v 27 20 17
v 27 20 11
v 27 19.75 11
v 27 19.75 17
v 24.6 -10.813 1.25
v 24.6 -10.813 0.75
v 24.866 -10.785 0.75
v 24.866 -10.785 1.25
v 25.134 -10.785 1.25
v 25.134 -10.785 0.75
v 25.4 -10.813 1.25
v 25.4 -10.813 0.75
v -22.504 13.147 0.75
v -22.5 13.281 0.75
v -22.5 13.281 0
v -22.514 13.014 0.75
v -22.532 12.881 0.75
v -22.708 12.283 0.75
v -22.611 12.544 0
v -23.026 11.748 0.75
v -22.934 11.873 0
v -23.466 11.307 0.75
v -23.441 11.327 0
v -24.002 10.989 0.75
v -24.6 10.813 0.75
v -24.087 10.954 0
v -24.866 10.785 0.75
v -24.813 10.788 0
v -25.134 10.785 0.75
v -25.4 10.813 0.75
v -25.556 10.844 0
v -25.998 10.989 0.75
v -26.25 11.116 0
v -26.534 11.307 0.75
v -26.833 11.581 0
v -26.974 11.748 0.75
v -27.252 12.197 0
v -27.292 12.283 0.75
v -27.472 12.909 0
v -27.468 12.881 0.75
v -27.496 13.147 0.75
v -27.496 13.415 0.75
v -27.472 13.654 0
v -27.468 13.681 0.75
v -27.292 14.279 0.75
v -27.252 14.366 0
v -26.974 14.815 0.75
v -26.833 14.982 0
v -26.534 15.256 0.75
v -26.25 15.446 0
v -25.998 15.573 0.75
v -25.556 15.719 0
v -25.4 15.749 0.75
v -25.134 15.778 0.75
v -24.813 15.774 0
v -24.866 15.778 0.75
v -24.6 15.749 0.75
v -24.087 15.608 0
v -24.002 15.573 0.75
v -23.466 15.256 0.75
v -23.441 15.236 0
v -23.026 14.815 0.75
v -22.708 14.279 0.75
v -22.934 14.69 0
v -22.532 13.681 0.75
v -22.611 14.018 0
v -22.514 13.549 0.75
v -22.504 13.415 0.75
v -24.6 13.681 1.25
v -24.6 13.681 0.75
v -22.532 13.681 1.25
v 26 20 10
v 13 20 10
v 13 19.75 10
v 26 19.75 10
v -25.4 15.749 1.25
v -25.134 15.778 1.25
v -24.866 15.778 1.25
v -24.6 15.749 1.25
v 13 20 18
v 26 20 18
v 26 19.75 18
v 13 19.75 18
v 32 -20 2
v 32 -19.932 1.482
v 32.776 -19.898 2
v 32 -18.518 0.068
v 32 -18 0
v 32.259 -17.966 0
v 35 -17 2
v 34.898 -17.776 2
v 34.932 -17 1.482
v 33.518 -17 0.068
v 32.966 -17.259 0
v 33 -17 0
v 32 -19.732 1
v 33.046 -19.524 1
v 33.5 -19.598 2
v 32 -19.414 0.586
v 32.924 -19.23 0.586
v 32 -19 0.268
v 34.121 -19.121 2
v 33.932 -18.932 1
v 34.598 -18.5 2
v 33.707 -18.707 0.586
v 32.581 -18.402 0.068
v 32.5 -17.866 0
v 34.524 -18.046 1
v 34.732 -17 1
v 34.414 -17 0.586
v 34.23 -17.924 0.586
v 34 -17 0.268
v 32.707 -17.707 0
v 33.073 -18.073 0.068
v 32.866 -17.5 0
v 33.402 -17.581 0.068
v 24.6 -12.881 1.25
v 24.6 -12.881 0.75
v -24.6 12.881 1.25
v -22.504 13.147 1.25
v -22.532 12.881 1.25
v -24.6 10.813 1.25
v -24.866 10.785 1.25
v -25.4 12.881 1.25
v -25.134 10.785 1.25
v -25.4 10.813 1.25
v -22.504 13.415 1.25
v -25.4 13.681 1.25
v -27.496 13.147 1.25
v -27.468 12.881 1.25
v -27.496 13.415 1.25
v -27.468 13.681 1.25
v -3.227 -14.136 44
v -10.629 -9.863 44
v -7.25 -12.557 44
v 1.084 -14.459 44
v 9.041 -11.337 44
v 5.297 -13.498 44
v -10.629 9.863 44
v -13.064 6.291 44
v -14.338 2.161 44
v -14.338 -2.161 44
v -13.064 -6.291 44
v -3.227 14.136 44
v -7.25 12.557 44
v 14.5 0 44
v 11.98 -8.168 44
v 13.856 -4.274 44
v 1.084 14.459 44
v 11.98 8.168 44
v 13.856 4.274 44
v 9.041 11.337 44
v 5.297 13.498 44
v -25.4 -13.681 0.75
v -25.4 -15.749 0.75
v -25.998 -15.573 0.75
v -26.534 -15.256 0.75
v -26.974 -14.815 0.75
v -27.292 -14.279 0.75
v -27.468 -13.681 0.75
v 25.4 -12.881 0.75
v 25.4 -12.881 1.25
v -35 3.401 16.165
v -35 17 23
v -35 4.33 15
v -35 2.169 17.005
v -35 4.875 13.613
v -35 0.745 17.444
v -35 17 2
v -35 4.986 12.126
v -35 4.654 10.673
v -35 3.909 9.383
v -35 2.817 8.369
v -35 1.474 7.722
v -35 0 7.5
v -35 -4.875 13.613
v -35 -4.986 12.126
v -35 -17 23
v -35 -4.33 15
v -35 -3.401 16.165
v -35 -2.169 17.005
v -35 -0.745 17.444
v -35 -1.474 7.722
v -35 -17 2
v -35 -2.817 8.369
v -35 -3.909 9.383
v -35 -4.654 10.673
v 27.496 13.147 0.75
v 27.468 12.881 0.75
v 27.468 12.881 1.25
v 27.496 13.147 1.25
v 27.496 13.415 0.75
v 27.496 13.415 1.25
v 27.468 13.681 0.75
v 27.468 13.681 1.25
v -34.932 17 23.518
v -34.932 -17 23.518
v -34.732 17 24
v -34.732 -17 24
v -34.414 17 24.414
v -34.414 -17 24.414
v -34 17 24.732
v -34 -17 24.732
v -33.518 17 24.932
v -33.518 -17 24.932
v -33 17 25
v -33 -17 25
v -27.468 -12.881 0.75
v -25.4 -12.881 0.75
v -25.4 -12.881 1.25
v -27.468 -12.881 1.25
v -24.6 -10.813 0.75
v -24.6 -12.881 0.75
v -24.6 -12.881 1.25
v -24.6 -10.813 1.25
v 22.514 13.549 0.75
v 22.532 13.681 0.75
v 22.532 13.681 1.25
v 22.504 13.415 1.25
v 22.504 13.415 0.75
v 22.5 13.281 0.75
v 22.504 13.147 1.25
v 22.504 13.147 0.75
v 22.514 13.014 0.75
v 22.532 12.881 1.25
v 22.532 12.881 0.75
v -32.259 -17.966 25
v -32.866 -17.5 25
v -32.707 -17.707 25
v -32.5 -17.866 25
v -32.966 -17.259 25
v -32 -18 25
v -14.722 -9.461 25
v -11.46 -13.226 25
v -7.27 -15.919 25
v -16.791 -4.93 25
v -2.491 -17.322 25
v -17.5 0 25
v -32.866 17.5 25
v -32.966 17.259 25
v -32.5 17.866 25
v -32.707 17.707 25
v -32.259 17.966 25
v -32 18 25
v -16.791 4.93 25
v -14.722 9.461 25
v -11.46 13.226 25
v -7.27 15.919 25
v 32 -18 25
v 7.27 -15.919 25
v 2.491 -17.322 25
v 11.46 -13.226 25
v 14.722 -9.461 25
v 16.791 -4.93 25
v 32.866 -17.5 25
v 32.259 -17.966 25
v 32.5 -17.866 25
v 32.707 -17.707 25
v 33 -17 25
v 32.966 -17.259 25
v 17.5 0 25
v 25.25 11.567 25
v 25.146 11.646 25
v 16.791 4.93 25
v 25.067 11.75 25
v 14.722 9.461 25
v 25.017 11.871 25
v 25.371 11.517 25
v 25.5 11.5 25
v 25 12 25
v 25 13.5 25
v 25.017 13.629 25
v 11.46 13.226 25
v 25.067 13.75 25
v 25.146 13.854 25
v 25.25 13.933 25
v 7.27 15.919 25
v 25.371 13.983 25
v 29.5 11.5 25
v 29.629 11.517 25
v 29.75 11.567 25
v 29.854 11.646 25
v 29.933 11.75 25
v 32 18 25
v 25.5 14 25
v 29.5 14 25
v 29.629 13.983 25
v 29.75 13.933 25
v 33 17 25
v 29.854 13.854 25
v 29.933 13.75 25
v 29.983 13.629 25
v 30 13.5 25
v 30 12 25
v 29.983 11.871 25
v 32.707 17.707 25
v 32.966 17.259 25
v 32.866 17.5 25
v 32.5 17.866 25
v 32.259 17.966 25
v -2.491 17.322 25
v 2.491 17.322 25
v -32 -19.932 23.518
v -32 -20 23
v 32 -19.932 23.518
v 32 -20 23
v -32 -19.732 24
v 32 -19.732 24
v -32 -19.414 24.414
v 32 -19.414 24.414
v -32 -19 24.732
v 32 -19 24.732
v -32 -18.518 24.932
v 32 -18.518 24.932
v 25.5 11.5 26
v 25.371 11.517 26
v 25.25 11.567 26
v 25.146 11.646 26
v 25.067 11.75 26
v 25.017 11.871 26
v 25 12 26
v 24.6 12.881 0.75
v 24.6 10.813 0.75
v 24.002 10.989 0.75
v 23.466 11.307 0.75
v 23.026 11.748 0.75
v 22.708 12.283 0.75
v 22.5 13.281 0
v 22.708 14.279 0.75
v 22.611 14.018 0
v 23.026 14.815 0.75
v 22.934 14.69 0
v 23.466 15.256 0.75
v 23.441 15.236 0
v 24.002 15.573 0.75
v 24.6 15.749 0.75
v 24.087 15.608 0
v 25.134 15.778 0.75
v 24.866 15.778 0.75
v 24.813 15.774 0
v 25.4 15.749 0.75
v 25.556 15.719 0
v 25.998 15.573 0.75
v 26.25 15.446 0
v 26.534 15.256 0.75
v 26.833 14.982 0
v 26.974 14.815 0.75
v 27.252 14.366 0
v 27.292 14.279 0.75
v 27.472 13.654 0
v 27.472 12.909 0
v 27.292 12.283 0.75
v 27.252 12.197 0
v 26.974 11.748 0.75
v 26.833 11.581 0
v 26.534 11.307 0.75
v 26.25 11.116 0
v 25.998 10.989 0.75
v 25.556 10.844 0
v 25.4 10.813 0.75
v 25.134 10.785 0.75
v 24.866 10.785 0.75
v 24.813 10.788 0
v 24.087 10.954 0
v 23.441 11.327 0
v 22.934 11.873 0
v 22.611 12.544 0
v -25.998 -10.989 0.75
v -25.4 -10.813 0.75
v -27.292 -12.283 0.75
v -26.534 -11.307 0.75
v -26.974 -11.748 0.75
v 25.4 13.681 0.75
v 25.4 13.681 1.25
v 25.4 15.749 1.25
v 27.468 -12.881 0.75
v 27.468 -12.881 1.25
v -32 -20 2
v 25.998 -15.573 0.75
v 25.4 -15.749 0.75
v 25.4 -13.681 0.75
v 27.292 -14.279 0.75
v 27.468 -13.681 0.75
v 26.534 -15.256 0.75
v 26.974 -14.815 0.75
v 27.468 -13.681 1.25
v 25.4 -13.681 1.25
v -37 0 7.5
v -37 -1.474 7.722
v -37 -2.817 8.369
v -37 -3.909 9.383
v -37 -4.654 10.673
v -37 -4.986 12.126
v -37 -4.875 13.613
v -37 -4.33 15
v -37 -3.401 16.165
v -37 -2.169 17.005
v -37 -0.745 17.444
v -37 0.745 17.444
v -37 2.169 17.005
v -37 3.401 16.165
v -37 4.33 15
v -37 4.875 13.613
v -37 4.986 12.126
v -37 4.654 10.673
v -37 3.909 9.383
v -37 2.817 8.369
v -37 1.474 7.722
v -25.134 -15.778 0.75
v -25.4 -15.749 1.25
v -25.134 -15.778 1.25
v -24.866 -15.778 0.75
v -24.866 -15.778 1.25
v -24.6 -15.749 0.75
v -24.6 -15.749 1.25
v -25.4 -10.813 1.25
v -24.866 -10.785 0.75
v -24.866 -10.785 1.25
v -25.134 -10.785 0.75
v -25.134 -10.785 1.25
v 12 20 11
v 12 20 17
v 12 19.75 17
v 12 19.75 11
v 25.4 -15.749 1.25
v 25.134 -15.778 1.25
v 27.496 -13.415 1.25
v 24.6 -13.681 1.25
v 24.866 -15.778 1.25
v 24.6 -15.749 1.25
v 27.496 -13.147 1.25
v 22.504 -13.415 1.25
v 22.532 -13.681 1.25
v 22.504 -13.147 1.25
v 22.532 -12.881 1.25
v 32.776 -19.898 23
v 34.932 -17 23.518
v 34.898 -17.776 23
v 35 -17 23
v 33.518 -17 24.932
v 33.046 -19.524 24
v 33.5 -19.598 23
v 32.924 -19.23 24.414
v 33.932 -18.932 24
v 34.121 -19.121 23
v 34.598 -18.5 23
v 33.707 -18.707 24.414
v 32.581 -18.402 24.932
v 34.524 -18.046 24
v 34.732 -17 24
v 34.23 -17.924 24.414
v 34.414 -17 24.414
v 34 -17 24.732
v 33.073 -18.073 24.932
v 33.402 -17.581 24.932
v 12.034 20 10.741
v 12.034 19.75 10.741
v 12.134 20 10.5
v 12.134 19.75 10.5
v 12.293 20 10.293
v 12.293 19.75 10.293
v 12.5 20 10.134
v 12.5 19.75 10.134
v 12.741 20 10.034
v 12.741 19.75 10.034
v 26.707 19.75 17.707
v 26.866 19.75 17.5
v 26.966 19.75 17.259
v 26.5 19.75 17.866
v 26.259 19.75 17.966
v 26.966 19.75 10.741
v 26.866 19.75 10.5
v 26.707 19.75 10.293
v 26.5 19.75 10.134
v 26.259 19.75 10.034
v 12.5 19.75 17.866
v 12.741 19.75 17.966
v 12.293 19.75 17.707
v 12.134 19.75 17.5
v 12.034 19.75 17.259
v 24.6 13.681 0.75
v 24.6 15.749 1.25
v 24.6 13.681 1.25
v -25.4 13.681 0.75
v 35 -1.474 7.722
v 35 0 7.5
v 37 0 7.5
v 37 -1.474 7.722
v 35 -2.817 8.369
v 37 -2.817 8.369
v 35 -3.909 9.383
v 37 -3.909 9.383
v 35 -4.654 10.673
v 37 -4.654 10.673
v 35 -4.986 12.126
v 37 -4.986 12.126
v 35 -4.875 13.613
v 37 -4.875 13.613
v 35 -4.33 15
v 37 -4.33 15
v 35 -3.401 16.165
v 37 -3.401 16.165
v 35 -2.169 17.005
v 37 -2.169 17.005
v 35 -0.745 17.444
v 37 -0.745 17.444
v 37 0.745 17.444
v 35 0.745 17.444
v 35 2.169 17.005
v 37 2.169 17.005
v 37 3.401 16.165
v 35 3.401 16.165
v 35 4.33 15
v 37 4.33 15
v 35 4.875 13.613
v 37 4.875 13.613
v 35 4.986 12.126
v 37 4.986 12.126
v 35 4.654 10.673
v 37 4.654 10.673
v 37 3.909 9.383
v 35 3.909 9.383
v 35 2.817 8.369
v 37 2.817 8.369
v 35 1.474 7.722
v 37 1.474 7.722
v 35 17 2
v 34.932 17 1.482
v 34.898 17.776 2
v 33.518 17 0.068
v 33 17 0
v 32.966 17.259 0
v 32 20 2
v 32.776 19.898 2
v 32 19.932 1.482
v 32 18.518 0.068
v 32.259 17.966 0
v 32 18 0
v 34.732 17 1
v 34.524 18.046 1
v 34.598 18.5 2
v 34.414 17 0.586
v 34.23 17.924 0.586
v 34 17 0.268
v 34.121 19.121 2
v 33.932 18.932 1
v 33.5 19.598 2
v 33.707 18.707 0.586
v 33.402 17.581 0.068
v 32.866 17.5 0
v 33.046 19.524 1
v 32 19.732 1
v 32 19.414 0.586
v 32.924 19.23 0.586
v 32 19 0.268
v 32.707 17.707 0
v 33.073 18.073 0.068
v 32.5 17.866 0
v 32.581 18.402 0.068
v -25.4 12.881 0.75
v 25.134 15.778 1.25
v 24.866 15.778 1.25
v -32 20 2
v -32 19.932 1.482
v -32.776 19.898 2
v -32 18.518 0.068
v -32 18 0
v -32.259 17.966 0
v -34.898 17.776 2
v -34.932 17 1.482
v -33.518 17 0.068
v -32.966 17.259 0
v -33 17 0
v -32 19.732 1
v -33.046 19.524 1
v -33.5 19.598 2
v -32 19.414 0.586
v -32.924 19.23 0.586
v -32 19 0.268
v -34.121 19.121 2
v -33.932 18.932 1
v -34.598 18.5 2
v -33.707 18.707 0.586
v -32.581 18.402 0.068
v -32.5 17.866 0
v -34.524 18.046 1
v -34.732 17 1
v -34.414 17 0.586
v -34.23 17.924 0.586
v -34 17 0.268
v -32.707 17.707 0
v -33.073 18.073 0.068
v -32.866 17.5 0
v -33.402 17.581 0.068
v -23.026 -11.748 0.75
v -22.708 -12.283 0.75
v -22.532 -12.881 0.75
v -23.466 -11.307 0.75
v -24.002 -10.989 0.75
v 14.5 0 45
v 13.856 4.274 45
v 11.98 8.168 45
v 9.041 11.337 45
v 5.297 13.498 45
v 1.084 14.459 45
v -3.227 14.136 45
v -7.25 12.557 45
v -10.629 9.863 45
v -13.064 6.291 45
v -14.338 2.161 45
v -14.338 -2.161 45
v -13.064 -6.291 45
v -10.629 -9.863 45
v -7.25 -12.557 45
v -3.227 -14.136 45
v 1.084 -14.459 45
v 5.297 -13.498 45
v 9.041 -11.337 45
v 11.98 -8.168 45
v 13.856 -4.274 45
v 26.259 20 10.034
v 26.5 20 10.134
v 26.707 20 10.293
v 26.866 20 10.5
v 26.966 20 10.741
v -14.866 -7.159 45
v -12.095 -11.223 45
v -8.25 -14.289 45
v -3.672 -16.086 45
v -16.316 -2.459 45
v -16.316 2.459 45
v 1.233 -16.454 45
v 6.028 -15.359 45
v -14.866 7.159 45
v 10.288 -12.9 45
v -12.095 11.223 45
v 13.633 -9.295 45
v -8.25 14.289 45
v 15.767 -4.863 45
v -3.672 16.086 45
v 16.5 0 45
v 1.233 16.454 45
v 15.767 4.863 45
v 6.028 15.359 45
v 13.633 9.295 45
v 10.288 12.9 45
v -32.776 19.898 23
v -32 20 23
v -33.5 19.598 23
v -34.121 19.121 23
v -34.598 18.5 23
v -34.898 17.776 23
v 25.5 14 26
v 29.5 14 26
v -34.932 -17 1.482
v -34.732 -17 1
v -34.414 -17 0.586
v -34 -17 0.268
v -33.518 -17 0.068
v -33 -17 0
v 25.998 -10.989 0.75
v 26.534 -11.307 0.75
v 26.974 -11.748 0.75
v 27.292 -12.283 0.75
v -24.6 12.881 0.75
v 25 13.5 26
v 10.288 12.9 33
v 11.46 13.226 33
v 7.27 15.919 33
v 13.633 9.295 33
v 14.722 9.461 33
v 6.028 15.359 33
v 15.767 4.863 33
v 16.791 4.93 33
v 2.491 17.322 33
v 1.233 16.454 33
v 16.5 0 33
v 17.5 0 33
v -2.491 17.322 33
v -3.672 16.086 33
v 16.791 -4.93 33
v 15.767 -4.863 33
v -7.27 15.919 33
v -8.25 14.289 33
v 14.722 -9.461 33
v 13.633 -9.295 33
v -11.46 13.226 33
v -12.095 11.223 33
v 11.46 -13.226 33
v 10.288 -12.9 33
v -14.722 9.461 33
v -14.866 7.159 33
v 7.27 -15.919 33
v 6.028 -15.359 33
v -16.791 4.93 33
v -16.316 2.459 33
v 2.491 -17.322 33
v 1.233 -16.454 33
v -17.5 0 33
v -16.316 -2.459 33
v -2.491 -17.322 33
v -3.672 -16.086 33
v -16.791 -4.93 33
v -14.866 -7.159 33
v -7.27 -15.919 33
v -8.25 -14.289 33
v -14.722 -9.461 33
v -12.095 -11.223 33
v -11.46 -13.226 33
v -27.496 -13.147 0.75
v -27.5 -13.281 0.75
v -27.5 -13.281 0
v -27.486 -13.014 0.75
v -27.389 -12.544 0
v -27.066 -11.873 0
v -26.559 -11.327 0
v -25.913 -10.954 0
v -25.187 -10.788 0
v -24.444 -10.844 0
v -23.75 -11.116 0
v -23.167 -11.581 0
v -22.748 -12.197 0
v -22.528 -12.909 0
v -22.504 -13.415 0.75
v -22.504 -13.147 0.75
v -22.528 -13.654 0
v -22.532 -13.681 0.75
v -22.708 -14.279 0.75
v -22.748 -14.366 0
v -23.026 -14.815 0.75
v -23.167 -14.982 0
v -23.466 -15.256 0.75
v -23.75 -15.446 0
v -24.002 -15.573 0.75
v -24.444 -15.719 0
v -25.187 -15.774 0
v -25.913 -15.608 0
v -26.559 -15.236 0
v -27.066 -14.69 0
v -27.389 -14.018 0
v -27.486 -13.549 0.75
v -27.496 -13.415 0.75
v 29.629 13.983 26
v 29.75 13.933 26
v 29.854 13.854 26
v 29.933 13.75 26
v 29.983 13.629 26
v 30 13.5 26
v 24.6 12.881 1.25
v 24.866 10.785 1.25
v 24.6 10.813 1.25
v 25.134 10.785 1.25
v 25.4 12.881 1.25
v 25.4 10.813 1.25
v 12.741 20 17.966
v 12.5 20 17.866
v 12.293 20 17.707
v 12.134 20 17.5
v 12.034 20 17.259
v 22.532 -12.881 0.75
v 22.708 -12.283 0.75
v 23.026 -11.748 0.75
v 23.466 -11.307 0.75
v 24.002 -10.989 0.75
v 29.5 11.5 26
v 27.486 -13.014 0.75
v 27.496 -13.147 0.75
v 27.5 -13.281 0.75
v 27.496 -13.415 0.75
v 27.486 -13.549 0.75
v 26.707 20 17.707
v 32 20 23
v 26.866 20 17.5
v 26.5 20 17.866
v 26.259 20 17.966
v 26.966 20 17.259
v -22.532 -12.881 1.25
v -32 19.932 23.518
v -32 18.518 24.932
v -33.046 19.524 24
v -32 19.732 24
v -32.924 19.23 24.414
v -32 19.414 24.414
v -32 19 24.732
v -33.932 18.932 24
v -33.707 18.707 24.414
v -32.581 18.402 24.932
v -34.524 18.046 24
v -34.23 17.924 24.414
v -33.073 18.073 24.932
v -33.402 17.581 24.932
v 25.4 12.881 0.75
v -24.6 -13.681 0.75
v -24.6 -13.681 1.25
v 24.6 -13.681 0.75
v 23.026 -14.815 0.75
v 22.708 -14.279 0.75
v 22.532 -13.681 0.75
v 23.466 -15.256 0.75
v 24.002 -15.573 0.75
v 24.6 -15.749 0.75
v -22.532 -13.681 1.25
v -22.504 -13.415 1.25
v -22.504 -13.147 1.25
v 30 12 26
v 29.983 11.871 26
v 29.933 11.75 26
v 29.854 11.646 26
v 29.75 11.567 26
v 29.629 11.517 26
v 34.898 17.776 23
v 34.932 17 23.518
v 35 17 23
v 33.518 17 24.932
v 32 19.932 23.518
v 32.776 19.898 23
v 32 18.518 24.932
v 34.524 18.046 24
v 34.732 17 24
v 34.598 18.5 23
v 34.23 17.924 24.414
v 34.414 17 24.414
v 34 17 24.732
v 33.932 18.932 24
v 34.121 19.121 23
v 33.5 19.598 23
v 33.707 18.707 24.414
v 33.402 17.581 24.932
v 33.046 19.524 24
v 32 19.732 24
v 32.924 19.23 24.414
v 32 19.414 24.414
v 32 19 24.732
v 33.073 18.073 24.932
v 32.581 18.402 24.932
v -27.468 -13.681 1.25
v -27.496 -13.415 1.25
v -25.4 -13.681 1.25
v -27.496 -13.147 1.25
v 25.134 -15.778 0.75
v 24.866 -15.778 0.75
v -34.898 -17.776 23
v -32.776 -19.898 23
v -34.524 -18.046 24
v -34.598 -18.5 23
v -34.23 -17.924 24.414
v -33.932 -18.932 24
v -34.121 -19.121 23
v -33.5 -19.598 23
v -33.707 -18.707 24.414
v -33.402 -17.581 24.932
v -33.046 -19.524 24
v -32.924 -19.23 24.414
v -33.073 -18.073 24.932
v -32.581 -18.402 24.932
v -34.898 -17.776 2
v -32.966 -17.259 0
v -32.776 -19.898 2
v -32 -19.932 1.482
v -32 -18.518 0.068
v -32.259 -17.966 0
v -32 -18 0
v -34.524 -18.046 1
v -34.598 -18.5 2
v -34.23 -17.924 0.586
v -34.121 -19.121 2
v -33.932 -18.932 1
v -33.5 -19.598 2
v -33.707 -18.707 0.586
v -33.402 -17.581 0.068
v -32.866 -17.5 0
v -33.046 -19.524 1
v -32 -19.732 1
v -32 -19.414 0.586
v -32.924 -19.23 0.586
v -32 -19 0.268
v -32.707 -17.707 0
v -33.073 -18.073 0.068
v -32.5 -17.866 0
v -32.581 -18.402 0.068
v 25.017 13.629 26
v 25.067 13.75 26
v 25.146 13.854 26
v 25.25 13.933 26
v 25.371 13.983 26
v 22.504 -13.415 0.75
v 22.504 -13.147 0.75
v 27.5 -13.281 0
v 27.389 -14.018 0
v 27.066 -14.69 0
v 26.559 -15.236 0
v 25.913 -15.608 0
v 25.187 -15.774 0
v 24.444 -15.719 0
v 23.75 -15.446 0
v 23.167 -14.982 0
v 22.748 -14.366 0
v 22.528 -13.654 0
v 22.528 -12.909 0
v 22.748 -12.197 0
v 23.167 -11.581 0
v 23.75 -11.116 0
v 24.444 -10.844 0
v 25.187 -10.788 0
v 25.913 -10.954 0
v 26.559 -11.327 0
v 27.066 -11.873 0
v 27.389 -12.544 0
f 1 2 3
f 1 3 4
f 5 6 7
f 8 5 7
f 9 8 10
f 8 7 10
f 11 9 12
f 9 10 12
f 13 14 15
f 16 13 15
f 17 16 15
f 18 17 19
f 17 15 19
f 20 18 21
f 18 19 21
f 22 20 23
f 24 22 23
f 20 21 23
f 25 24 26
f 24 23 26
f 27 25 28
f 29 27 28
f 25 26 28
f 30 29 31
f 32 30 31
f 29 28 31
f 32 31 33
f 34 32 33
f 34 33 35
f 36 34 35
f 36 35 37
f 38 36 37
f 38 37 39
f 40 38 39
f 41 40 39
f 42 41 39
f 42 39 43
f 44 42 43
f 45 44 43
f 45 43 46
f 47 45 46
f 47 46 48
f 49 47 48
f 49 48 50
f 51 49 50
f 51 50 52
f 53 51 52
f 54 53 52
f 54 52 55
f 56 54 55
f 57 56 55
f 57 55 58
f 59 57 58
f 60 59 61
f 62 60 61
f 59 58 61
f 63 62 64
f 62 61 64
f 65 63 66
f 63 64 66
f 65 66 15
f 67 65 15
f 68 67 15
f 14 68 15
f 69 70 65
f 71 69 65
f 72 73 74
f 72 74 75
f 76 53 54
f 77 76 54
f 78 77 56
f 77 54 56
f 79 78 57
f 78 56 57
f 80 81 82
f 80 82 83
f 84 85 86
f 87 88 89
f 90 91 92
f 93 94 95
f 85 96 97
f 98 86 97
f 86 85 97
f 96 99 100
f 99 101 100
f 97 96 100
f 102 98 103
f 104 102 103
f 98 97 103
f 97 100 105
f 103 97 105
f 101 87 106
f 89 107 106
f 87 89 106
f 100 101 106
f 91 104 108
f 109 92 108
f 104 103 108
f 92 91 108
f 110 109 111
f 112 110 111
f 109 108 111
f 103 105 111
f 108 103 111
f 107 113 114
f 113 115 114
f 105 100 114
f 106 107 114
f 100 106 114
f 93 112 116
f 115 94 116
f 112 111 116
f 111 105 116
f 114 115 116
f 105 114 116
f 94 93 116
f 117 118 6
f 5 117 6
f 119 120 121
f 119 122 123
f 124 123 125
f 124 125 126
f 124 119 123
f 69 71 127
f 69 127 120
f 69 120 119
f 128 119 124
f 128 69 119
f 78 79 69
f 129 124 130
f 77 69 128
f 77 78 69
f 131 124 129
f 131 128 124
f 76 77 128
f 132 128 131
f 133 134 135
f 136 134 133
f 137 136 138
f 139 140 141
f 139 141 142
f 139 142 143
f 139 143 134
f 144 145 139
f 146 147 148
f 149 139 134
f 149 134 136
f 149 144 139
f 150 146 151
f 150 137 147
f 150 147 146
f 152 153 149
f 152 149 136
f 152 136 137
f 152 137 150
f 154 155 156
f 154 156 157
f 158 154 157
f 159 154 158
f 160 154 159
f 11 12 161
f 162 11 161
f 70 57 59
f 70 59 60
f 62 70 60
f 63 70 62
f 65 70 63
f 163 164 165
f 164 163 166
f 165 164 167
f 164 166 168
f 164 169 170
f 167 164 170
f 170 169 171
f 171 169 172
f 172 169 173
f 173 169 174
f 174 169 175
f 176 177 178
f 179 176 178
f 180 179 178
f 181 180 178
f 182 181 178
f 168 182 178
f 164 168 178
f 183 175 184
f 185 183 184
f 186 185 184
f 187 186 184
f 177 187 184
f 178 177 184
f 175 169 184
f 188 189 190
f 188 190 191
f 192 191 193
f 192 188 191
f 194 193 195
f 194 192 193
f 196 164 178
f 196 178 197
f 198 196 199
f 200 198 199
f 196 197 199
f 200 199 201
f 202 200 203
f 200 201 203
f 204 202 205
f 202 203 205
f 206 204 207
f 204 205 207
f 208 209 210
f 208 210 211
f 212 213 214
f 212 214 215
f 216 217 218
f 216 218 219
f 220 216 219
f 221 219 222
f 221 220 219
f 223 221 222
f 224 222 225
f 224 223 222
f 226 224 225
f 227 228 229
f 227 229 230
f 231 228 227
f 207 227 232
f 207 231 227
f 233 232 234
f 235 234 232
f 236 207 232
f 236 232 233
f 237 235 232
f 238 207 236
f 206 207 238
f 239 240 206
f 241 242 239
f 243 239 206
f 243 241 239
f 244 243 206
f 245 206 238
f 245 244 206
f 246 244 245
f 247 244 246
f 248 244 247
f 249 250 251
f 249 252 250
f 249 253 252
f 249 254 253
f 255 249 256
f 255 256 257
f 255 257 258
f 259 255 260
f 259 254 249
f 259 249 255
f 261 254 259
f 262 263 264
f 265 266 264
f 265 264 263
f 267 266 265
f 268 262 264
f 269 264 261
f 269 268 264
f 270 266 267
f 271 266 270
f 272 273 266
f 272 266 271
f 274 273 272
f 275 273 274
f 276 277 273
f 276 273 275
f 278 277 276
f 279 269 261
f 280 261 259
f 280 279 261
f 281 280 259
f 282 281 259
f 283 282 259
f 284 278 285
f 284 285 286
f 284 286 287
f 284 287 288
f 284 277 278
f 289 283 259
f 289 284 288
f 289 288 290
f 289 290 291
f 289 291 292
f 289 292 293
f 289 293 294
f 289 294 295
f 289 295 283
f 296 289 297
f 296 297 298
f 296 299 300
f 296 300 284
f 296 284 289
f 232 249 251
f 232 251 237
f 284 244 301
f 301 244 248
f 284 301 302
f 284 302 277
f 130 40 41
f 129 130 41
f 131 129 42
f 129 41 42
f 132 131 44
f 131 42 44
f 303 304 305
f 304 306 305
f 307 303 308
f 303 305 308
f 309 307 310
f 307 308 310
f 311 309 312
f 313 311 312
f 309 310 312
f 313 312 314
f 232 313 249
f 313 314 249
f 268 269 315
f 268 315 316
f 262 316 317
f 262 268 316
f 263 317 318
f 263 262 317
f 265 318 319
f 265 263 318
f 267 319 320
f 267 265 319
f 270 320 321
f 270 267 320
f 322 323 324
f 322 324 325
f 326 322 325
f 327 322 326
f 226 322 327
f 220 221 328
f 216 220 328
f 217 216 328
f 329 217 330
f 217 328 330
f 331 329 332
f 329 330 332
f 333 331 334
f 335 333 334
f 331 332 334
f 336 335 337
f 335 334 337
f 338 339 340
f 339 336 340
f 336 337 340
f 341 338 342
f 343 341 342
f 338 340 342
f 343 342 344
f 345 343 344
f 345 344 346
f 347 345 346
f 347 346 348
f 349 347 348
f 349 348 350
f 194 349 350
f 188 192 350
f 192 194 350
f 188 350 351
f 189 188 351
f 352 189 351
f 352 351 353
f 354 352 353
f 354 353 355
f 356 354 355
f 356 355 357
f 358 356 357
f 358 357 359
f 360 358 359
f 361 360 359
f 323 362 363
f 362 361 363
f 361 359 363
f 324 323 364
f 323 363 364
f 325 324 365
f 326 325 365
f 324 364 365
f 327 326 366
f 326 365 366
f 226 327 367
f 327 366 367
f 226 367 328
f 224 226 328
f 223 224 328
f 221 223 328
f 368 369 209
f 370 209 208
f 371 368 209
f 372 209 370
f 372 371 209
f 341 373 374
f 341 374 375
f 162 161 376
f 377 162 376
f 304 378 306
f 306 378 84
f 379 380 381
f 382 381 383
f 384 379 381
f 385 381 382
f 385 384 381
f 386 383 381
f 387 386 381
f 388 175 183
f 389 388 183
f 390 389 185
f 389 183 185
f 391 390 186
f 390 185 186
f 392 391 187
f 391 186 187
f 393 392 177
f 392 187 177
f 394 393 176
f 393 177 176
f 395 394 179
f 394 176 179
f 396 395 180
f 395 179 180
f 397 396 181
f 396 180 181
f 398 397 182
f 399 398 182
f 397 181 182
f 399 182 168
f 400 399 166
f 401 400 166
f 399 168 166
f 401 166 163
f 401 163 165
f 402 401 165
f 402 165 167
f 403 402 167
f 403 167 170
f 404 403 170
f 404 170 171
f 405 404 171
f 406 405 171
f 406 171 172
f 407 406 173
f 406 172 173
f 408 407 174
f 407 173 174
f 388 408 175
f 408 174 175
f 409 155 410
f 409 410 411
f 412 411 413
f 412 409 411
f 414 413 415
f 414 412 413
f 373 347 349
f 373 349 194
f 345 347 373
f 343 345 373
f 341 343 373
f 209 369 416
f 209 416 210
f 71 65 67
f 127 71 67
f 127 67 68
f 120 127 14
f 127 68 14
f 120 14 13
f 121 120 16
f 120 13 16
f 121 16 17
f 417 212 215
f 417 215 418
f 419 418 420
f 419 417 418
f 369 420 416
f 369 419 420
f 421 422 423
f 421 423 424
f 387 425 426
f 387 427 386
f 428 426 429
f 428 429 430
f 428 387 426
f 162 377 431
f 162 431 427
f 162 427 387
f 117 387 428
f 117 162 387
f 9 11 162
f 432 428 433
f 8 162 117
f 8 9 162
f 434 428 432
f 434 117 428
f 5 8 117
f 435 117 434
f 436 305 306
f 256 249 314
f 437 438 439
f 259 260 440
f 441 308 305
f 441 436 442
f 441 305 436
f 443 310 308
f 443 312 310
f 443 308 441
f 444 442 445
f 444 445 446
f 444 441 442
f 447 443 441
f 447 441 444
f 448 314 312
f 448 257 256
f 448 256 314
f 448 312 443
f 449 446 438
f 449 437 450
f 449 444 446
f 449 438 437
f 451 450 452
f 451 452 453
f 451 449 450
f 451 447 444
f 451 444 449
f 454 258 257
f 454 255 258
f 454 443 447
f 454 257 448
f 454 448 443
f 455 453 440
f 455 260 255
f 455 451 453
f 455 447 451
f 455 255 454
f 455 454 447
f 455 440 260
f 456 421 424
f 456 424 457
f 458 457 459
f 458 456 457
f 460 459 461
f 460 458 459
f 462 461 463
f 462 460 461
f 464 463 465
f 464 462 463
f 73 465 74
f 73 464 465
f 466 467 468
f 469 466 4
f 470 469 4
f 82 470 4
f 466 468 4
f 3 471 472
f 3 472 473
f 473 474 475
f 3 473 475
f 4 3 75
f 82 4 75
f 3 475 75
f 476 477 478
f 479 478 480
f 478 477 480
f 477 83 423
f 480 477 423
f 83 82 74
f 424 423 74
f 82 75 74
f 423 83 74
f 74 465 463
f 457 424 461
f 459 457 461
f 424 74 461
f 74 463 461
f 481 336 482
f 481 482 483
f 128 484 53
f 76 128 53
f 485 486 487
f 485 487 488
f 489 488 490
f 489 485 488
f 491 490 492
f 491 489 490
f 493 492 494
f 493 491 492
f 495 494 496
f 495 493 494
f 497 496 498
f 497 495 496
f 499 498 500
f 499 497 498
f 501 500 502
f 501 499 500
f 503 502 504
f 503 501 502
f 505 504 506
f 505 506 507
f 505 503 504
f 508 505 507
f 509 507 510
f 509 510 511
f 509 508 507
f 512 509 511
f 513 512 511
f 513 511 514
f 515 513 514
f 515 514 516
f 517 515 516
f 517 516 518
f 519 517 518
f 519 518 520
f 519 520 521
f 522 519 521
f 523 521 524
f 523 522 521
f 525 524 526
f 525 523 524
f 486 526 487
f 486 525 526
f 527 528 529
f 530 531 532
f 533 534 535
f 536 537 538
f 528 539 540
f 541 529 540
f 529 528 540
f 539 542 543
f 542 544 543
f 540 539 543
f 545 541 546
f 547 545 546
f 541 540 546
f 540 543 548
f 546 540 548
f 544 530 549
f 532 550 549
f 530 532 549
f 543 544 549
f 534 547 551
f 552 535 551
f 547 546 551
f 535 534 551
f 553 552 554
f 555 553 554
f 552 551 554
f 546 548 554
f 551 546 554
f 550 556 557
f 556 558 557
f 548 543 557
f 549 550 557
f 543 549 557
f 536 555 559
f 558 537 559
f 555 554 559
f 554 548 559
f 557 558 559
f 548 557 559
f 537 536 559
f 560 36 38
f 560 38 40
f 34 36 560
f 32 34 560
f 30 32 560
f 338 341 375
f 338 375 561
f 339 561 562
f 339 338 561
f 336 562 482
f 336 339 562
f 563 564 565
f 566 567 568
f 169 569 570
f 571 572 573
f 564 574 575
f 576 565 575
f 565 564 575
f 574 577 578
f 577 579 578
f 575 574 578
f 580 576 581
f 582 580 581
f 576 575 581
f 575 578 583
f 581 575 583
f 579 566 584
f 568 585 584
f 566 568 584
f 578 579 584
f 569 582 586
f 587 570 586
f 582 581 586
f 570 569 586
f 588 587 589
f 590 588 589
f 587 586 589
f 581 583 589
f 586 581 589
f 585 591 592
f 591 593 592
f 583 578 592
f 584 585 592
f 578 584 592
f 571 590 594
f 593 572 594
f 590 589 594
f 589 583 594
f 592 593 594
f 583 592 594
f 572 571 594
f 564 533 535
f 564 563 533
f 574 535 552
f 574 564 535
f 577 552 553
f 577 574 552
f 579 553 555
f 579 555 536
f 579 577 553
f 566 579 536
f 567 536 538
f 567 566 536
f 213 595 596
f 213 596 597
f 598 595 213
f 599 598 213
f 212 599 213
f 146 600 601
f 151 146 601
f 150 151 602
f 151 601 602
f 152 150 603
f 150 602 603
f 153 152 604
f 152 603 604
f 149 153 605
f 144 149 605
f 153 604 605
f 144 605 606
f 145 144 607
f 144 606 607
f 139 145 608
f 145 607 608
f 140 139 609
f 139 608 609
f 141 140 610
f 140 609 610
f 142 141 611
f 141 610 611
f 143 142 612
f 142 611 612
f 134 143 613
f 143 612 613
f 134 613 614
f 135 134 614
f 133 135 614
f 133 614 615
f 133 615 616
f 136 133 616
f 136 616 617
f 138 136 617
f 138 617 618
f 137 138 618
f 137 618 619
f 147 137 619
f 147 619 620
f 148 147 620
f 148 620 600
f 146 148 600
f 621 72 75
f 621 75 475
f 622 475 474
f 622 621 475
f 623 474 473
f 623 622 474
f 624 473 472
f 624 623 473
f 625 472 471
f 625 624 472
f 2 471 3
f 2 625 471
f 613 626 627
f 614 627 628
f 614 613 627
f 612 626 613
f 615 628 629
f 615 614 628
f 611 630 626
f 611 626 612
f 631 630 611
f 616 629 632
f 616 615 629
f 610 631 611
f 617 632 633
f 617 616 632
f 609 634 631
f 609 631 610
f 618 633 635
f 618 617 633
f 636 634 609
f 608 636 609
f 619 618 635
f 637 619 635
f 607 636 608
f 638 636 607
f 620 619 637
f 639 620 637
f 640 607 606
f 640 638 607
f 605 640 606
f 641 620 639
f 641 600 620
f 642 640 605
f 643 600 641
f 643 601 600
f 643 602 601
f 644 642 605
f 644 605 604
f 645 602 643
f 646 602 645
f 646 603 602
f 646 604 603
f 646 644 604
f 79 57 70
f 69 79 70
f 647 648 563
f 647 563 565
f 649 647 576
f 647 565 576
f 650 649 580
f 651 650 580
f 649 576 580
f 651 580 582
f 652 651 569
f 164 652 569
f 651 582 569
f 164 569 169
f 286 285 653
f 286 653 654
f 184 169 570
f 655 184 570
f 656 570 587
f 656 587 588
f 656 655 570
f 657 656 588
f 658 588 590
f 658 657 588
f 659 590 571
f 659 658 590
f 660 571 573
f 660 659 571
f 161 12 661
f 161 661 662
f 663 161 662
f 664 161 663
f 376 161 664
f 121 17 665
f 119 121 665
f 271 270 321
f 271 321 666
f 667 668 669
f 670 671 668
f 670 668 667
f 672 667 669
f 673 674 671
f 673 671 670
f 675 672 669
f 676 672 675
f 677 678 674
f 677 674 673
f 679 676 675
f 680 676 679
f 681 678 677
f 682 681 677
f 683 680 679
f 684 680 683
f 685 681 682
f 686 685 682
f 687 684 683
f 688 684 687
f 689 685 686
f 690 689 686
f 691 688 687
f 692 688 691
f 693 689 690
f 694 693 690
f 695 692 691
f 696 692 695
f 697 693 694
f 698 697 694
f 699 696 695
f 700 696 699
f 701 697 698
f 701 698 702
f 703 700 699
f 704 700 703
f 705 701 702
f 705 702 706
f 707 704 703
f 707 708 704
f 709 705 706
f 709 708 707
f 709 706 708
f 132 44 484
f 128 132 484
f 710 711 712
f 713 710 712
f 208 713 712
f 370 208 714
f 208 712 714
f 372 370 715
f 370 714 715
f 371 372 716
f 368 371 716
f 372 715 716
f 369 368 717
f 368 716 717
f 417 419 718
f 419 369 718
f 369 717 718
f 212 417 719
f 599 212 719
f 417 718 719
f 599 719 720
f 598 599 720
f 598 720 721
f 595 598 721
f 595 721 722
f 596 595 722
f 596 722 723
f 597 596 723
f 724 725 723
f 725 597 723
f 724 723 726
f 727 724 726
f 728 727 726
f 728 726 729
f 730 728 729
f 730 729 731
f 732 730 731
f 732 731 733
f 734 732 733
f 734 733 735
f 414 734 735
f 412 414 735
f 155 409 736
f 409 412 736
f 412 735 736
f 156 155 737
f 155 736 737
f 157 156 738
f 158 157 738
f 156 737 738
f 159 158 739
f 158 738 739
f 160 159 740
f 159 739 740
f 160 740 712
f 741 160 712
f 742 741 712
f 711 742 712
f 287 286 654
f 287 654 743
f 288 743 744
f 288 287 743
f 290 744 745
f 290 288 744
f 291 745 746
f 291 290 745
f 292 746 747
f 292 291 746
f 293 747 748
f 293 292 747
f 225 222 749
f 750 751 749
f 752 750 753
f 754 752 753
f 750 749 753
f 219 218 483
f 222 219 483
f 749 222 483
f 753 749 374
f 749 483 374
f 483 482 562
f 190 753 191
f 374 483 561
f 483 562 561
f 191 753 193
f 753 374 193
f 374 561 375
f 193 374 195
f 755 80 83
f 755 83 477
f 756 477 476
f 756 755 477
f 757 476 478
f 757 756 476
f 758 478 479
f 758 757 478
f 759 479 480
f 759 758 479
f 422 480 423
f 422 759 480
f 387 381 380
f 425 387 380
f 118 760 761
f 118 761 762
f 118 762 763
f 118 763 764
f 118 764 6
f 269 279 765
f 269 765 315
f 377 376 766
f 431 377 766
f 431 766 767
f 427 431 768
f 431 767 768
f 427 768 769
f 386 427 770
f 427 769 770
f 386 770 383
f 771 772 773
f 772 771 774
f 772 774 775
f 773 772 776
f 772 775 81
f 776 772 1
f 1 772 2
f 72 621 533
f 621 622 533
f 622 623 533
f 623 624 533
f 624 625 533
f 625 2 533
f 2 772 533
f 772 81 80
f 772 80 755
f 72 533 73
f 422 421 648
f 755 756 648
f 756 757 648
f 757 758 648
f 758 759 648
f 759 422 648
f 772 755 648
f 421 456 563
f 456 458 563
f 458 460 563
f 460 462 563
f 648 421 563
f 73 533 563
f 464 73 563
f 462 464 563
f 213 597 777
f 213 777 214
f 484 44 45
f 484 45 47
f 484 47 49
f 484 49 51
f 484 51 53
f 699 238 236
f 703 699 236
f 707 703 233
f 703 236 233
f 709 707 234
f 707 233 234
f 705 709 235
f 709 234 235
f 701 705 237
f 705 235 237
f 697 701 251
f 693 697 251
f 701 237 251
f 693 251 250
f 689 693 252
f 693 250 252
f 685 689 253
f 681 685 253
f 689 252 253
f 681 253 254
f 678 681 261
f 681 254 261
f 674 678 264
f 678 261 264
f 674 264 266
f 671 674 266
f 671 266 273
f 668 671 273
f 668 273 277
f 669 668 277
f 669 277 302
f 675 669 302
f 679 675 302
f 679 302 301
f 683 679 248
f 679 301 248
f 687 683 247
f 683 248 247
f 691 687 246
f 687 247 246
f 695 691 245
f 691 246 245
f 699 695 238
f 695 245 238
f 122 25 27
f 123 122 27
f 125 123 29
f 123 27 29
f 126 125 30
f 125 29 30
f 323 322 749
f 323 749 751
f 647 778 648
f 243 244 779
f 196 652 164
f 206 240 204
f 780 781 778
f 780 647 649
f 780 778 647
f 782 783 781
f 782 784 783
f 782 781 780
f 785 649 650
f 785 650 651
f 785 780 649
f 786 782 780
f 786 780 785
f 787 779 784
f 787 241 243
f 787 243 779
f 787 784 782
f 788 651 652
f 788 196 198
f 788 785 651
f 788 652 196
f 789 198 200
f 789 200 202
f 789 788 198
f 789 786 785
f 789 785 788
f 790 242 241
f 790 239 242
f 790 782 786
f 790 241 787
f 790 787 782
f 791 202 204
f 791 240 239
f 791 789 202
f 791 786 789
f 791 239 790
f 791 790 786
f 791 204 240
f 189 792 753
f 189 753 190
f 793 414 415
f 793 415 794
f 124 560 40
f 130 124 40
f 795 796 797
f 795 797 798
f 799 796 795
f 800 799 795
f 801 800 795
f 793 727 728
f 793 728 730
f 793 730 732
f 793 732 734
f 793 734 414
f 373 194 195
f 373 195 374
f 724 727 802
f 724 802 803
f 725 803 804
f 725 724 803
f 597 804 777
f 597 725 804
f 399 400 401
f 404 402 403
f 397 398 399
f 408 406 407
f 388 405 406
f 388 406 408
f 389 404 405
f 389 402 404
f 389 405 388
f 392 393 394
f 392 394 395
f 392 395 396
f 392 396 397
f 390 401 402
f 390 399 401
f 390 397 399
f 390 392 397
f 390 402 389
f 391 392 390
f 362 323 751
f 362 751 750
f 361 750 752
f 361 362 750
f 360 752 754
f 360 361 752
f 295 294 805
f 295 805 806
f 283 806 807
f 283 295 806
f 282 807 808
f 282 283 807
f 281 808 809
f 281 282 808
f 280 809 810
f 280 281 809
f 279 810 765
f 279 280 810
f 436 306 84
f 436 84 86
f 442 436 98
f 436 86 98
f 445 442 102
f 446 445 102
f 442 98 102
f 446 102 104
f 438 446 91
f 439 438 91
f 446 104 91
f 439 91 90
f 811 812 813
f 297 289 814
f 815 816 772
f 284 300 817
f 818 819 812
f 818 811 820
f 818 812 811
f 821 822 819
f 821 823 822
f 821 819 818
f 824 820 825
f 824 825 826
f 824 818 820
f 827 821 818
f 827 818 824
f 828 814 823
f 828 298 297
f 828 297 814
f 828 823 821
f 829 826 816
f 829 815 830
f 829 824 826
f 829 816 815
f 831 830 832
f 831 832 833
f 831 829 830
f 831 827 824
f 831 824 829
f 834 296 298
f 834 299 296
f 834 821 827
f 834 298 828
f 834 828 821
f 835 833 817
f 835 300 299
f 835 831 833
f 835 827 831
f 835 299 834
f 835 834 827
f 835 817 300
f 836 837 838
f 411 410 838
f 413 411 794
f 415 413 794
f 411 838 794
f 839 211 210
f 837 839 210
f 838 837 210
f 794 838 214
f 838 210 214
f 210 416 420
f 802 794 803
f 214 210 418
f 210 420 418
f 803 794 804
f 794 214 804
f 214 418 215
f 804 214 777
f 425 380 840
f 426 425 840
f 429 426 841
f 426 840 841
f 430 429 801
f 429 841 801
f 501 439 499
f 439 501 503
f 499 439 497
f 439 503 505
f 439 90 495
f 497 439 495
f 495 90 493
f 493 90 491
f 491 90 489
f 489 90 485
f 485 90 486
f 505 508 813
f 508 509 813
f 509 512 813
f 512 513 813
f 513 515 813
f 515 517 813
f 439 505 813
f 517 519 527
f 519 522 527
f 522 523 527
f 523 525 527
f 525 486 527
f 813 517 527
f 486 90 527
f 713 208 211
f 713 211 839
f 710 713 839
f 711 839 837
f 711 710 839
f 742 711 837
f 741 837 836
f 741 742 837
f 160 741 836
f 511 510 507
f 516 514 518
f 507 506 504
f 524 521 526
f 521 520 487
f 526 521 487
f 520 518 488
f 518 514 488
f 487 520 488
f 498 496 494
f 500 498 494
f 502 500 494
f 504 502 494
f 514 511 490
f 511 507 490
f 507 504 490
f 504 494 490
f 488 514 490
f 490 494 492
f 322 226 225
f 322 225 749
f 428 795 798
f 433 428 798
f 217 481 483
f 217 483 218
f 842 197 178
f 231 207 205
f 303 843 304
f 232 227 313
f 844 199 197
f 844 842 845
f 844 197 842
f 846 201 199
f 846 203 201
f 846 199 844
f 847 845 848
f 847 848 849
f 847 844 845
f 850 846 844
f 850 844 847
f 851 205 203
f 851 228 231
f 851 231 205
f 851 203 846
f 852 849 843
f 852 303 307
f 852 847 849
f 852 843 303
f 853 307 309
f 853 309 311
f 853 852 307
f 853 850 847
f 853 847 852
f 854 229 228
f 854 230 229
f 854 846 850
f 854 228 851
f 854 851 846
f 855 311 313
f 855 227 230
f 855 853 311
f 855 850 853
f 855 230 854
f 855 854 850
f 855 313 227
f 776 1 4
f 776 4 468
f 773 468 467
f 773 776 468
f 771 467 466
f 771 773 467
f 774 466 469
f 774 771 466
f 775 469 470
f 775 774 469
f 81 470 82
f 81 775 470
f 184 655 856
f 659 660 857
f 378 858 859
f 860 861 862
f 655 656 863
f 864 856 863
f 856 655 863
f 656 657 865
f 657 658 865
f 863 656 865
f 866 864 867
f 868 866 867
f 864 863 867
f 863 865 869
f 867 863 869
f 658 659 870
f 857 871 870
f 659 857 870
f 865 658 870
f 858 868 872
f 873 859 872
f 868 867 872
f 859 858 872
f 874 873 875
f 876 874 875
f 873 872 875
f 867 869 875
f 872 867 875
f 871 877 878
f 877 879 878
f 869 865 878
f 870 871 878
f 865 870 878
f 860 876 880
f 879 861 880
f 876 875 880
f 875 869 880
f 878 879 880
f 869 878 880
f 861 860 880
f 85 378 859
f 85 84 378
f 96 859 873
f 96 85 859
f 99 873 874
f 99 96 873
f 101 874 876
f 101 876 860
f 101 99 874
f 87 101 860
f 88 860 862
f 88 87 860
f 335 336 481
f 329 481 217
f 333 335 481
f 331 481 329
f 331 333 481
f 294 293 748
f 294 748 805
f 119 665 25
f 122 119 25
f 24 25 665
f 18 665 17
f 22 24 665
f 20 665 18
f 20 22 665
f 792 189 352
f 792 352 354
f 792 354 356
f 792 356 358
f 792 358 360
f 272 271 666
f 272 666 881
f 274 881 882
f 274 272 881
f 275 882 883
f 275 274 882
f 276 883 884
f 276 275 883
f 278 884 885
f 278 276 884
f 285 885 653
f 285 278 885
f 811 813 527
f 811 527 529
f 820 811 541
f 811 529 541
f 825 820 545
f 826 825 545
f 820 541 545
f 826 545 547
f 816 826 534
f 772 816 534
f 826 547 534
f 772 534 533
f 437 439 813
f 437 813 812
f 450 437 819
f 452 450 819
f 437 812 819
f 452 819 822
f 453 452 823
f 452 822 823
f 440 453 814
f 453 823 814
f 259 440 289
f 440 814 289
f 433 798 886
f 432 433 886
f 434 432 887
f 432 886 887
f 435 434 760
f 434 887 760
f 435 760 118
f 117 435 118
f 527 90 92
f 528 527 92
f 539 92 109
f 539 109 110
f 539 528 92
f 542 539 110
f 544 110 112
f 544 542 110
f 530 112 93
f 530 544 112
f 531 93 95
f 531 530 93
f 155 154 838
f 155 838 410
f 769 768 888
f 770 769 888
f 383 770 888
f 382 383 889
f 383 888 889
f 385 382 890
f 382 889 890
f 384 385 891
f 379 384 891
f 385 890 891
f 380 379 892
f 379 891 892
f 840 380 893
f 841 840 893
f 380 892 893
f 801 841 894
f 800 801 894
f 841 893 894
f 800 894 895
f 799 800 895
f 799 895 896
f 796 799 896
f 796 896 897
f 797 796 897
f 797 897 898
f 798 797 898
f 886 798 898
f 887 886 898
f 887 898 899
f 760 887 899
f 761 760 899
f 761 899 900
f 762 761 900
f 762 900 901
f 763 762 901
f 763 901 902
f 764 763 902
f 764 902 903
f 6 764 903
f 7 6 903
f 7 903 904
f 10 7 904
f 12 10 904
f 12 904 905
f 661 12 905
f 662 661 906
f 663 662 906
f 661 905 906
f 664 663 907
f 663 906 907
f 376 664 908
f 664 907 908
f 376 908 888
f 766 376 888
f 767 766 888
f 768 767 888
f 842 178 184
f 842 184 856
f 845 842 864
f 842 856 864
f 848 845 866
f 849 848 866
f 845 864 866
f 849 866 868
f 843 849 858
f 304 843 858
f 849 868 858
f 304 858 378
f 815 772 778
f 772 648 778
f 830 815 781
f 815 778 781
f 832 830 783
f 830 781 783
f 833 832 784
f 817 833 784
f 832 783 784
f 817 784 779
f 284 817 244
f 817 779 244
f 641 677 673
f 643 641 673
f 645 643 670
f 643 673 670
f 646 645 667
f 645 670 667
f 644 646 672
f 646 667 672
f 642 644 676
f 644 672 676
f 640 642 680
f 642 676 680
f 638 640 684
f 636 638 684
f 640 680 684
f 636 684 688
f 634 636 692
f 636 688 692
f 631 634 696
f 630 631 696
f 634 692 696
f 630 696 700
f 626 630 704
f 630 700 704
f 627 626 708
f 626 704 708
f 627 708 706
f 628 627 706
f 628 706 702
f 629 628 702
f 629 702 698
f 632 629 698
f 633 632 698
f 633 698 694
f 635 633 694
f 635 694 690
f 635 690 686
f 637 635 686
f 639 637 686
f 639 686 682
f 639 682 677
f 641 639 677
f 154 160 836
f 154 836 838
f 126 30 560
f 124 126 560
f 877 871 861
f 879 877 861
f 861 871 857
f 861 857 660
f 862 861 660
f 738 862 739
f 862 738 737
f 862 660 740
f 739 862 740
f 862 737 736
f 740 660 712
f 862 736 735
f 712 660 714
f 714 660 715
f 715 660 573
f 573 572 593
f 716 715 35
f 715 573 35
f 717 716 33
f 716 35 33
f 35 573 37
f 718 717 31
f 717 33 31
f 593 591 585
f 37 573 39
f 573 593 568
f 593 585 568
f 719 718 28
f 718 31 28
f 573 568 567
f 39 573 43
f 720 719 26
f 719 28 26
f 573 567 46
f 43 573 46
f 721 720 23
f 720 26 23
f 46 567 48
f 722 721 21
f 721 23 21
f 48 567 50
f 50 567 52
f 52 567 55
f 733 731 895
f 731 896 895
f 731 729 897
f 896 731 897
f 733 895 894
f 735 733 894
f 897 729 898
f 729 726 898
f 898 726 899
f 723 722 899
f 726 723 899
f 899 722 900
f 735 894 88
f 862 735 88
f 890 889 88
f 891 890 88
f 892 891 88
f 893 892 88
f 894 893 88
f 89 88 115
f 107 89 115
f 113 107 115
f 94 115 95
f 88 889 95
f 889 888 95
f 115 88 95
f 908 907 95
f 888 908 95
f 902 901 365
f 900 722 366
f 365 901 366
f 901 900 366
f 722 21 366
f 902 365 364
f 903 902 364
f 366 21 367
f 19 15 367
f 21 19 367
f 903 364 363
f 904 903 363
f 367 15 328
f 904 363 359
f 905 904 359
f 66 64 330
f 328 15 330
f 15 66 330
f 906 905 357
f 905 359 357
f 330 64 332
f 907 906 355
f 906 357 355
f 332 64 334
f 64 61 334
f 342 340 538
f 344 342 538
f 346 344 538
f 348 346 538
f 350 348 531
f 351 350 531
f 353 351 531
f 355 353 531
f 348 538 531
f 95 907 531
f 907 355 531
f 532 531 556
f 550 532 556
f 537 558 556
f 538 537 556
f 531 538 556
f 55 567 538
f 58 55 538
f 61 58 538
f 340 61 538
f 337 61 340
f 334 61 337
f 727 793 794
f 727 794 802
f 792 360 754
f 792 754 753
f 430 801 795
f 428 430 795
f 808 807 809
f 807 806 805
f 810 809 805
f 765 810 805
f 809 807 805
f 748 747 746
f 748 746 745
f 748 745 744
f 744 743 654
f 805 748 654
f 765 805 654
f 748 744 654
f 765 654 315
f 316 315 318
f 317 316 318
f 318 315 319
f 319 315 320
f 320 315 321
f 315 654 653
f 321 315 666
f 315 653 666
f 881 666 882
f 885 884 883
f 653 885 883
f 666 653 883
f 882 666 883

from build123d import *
from build123d.topology import SkipClean

# Parameters (mm, degrees)
BOSS_EXTRUDE1_DEPTH = 25
FILLET1_R           = 2
SKETCH2_R           = 17.5
BOSS_EXTRUDE2_DEPTH = 8
SKETCH3_R           = 16.5
BOSS_EXTRUDE3_DEPTH = 12
SKETCH4_R           = 14.5
CUT_EXTRUDE1_DEPTH  = 2
SKETCH5_R           = 16.5
BOSS_EXTRUDE4_DEPTH = 1
SKETCH6_R           = 2.5
CUT_EXTRUDE2_DEPTH  = 0.75
CUT_EXTRUDE3_DEPTH  = 0.5
CUT_EXTRUDE4_DEPTH  = 0.25
SKETCH11_R          = 5
BOSS_EXTRUDE5_DEPTH = 2
BOSS_EXTRUDE6_DEPTH = 1


with BuildPart() as part:
    # Sketch1 → Boss-Extrude1 (new body)
    with BuildSketch(Plane.XY):
        with BuildLine():
            Line((-32, -20), (32, -20))
            ThreePointArc((32, -20), (34.121320344, -19.121320344), (35, -17))
            Line((35, -17), (35, 17))
            ThreePointArc((35, 17), (34.121320344, 19.121320344), (32, 20))
            Line((32, 20), (-32, 20))
            ThreePointArc((-32, 20), (-34.121320344, 19.121320344), (-35, 17))
            Line((-35, 17), (-35, -17))
            ThreePointArc((-35, -17), (-34.121320344, -19.121320344), (-32, -20))
        make_face()
    extrude(amount=BOSS_EXTRUDE1_DEPTH)

    # Fillet1
    fillet1_edges = [part.edges().sort_by_distance(p)[0] for p in [
        (0, -20, 0),
        (-34.121320344, -19.121320344, 0),
        (-35, 0, 0),
        (-34.121320344, 19.121320344, 0),
        (-34.121320344, -19.121320344, 25),
        (0, -20, 25),
        (34.121320344, -19.121320344, 25),
        (35, 0, 25),
        (34.121320344, 19.121320344, 25),
        (0, 20, 25),
        (-34.121320344, 19.121320344, 25),
        (0, 20, 0),
        (-35, 0, 25),
        (34.121320344, 19.121320344, 0),
        (35, 0, 0),
        (34.121320344, -19.121320344, 0),
    ]]
    fillet(fillet1_edges, radius=FILLET1_R)

    # Sketch2 → Boss-Extrude2 (add)
    with BuildSketch(Plane.XY.offset(25)):
        with Locations(Location((0, 0, 0), (0, 0, 180))):
            Circle(SKETCH2_R)
    extrude(amount=BOSS_EXTRUDE2_DEPTH)

    # Sketch3 → Boss-Extrude3 (add)
    with BuildSketch(Plane.XY.offset(33)):
        Circle(SKETCH3_R)
    extrude(amount=BOSS_EXTRUDE3_DEPTH)

    # Sketch4 → Cut-Extrude1 (cut)
    with BuildSketch(Plane.XY.offset(45)):
        Circle(SKETCH4_R)
    extrude(amount=-CUT_EXTRUDE1_DEPTH, mode=Mode.SUBTRACT)

    # Sketch5 → Boss-Extrude4 (add)
    with BuildSketch(Plane.XY.offset(43)):
        Circle(SKETCH5_R)
    extrude(amount=BOSS_EXTRUDE4_DEPTH)

    # Sketch6 → Cut-Extrude2 (cut)
    with BuildSketch(Plane(origin=(0, 0, 0), x_dir=(-1, 0, 0), z_dir=(0, 0, -1))):
        with Locations((-25, 13.28125)):
            Circle(SKETCH6_R)
        with Locations(Location((25, 13.28125, 0), (0, 0, 180))):
            Circle(SKETCH6_R)
        with Locations((25, -13.28125)):
            Circle(SKETCH6_R)
        with Locations(Location((-25, -13.28125, 0), (0, 0, 180))):
            Circle(SKETCH6_R)
    extrude(amount=-CUT_EXTRUDE2_DEPTH, mode=Mode.SUBTRACT)

    # Sketch7 → Cut-Extrude3 (cut)
    with SkipClean():  # the faces are left unmerged after this step: merging them gives an invalid solid
        with BuildSketch(Plane(origin=(0, 0, 0.75), x_dir=(-1, 0, 0), z_dir=(0, 0, -1))):
            with BuildLine():
                Line((-24.6, 15.749042536), (-24.6, 13.68125))
                Line((-24.6, 13.68125), (-22.532207464, 13.68125))
                ThreePointArc((-22.532207464, 13.68125), (-22.5, 13.28125), (-22.532207464, 12.88125))
                Line((-22.532207464, 12.88125), (-24.6, 12.88125))
                Line((-24.6, 12.88125), (-24.6, 10.813457464))
                ThreePointArc((-24.6, 10.813457464), (-25, 10.78125), (-25.4, 10.813457464))
                Line((-25.4, 10.813457464), (-25.4, 12.88125))
                Line((-25.4, 12.88125), (-27.467792536, 12.88125))
                ThreePointArc((-27.467792536, 12.88125), (-27.5, 13.28125), (-27.467792536, 13.68125))
                Line((-27.467792536, 13.68125), (-25.4, 13.68125))
                Line((-25.4, 13.68125), (-25.4, 15.749042536))
                ThreePointArc((-25.4, 15.749042536), (-25, 15.78125), (-24.6, 15.749042536))
            make_face()
            with BuildLine():
                Line((25.4, 13.68125), (25.4, 15.749042536))
                ThreePointArc((25.4, 15.749042536), (25, 15.78125), (24.6, 15.749042536))
                Line((24.6, 15.749042536), (24.6, 13.68125))
                Line((24.6, 13.68125), (22.532207464, 13.68125))
                ThreePointArc((22.532207464, 13.68125), (22.5, 13.28125), (22.532207464, 12.88125))
                Line((22.532207464, 12.88125), (24.6, 12.88125))
                Line((24.6, 12.88125), (24.6, 10.813457464))
                ThreePointArc((24.6, 10.813457464), (25, 10.78125), (25.4, 10.813457464))
                Line((25.4, 10.813457464), (25.4, 12.88125))
                Line((25.4, 12.88125), (27.467792536, 12.88125))
                ThreePointArc((27.467792536, 12.88125), (27.5, 13.28125), (27.467792536, 13.68125))
                Line((27.467792536, 13.68125), (25.4, 13.68125))
            make_face()
            with BuildLine():
                Line((24.6, -15.749042536), (24.6, -13.68125))
                Line((24.6, -13.68125), (22.532207464, -13.68125))
                ThreePointArc((22.532207464, -13.68125), (22.5, -13.28125), (22.532207464, -12.88125))
                Line((22.532207464, -12.88125), (24.6, -12.88125))
                Line((24.6, -12.88125), (24.6, -10.813457464))
                ThreePointArc((24.6, -10.813457464), (25, -10.78125), (25.4, -10.813457464))
                Line((25.4, -10.813457464), (25.4, -12.88125))
                Line((25.4, -12.88125), (27.467792536, -12.88125))
                ThreePointArc((27.467792536, -12.88125), (27.5, -13.28125), (27.467792536, -13.68125))
                Line((27.467792536, -13.68125), (25.4, -13.68125))
                Line((25.4, -13.68125), (25.4, -15.749042536))
                ThreePointArc((25.4, -15.749042536), (25, -15.78125), (24.6, -15.749042536))
            make_face()
            with BuildLine():
                Line((-25.4, -13.68125), (-25.4, -15.749042536))
                ThreePointArc((-25.4, -15.749042536), (-25, -15.78125), (-24.6, -15.749042536))
                Line((-24.6, -15.749042536), (-24.6, -13.68125))
                Line((-24.6, -13.68125), (-22.532207464, -13.68125))
                ThreePointArc((-22.532207464, -13.68125), (-22.5, -13.28125), (-22.532207464, -12.88125))
                Line((-22.532207464, -12.88125), (-24.6, -12.88125))
                Line((-24.6, -12.88125), (-24.6, -10.813457464))
                ThreePointArc((-24.6, -10.813457464), (-25, -10.78125), (-25.4, -10.813457464))
                Line((-25.4, -10.813457464), (-25.4, -12.88125))
                Line((-25.4, -12.88125), (-27.467792536, -12.88125))
                ThreePointArc((-27.467792536, -12.88125), (-27.5, -13.28125), (-27.467792536, -13.68125))
                Line((-27.467792536, -13.68125), (-25.4, -13.68125))
            make_face()
        extrude(amount=-CUT_EXTRUDE3_DEPTH, mode=Mode.SUBTRACT)

    # Sketch8 → Cut-Extrude4 (cut)
    with SkipClean():  # the faces are left unmerged after this step: merging them gives an invalid solid
        with BuildSketch(Plane(origin=(0, 20, 0), x_dir=(1, 0, 0), z_dir=(0, 1, 0))):
            with BuildLine():
                Line((26, -18), (13, -18))
                ThreePointArc((13, -18), (12.292893219, -17.707106781), (12, -17))
                Line((12, -17), (12, -11))
                ThreePointArc((12, -11), (12.292893219, -10.292893219), (13, -10))
                Line((13, -10), (26, -10))
                ThreePointArc((26, -10), (26.707106781, -10.292893219), (27, -11))
                Line((27, -11), (27, -17))
                ThreePointArc((27, -17), (26.707106781, -17.707106781), (26, -18))
            make_face()
        extrude(amount=-CUT_EXTRUDE4_DEPTH, mode=Mode.SUBTRACT)

    # Sketch11 → Boss-Extrude5 (add)
    with SkipClean():  # the faces are left unmerged after this step: merging them gives an invalid solid
        with BuildSketch(Plane.ZY.offset(35)):
            with Locations(Location((12.5, 0, 0), (0, 0, 180))):
                Circle(SKETCH11_R)
        boss_extrude5 = extrude(amount=BOSS_EXTRUDE5_DEPTH)

    # Mirror1: Boss-Extrude5 across plane
    with SkipClean():  # the faces are left unmerged after this step: merging them gives an invalid solid
        add(boss_extrude5.mirror(Plane(origin=(0, 0, 0), x_dir=(0, 0, 1), z_dir=(1, 0, 0))))

    # Sketch12 → Boss-Extrude6 (add)
    with SkipClean():  # the faces are left unmerged after this step: merging them gives an invalid solid
        with BuildSketch(Plane.XY.offset(25)):
            with BuildLine():
                Line((25.5, 14), (29.5, 14))
                ThreePointArc((29.5, 14), (29.853553391, 13.853553391), (30, 13.5))
                Line((30, 13.5), (30, 12))
                ThreePointArc((30, 12), (29.853553391, 11.646446609), (29.5, 11.5))
                Line((29.5, 11.5), (25.5, 11.5))
                ThreePointArc((25.5, 11.5), (25.146446609, 11.646446609), (25, 12))
                Line((25, 12), (25, 13.5))
                ThreePointArc((25, 13.5), (25.146446609, 13.853553391), (25.5, 14))
            make_face()
        extrude(amount=BOSS_EXTRUDE6_DEPTH)


solid = part.part
